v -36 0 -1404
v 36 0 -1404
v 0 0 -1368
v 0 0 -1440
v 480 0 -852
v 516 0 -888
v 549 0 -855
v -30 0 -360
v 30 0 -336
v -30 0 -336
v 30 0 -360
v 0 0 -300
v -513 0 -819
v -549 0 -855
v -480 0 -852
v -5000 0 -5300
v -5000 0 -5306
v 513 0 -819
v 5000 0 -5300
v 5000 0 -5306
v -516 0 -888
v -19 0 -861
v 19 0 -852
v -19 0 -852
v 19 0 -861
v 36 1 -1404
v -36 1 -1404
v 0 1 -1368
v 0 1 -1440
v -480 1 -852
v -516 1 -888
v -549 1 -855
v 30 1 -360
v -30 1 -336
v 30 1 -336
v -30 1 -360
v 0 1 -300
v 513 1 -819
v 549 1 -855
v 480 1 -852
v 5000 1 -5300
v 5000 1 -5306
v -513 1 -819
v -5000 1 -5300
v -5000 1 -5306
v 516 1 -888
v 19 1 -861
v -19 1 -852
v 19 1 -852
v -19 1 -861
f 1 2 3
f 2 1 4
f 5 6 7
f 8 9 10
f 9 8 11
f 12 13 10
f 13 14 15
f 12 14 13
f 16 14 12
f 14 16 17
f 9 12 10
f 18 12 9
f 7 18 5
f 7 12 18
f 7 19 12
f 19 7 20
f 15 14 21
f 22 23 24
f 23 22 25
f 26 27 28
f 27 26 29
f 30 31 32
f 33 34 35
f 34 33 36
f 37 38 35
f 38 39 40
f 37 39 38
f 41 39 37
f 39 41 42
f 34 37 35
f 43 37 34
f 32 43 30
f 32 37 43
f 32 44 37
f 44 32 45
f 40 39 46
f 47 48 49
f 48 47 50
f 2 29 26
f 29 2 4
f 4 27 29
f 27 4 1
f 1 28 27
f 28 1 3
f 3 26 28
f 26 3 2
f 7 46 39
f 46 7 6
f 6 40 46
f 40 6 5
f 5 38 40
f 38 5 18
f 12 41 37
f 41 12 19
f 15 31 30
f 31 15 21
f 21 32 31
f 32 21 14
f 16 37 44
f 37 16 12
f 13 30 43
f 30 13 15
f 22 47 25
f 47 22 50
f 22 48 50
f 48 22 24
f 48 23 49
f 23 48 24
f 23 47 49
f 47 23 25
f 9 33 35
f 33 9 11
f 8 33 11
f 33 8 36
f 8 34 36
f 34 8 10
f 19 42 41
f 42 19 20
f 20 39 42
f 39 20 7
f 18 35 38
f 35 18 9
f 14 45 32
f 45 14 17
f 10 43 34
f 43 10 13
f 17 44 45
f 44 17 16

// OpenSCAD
$fs = 120;

$vpt = [0,1080,480];
$vpr = [-34,0,0];
$vpf = 45;

foul_line = 6;
plain_color = [1,1,1,0.8];
out_color = [1,0.75,0.75,0.8];
eat_color = [0.5,0.75,1,0.8];

// home, first, second, third, rubber
color([1,1,1]) scale([1,-1,-1]) rotate([90,0,0]) linear_extrude(1) {
    polygon([[-30,30*2+300],[30,30*2+300],[30,30+300],[0,300],[-30,30+300]]);
    polygon([[552-36*2,852],[552-36,852+36],[552,852],[552-36,852-36]]);
    polygon([[0,1404+36],[36,1404],[0,1404-36],[-36,1404]]);
    polygon([[-552+36*2,852],[-552+36,852+36],[-552,852],[-552+36,852-36]]);
    polygon([[-19,852],[19,852],[19,9+852],[-19,9+852]]);
}

// foul lines
color([1,1,1,0.5]) scale([1,-1,-1]) rotate([90,0,0]) linear_extrude(1) {
    polygon([[0,300],[-5000,300+5000],[-5000,300+5000+foul_line],[0,300+foul_line]]);
    polygon([[0,300],[5000,300+5000],[5000,300+5000+foul_line],[0,300+foul_line]]);
}

scale([0.1,0.1,-0.1]) translate([-23200,0,0]) {
    color(out_color) polyhedron([[7490,0,18626],[22900,0,31940],[7490,1800,18626],[22900,1800,31940]], [[0,1,3,2]]);
    color(out_color) polyhedron([[7490,0,18626],[7490,0,18726],[7490,1800,18626],[7490,1800,18726]], [[0,1,3,2]]);
    color(out_color) polyhedron([[22900,0,31940],[22900,0,32040],[22900,1800,31940],[22900,1800,32040]], [[0,1,3,2]]);
    color(out_color) polyhedron([[7490,0,18726],[22900,0,32040],[7490,1800,18726],[22900,1800,32040]], [[0,1,3,2]]);
    color(out_color) polyhedron([[7490,1800,18626],[7490,1800,18726],[22900,1800,31940],[22900,1800,32040]], [[0,1,3,2]]);
    color(eat_color) polyhedron([[6180,0,25840],[15320,0,33640],[6180,5,25840],[15320,5,33640]], [[0,1,3,2]]);
    color(eat_color) polyhedron([[6180,0,25840],[1180,0,30810],[6180,5,25840],[1180,5,30810]], [[0,1,3,2]]);
    color(eat_color) polyhedron([[15320,0,33640],[10320,0,38610],[15320,5,33640],[10320,5,38610]], [[0,1,3,2]]);
    color(eat_color) polyhedron([[1180,0,30810],[10320,0,38610],[1180,5,30810],[10320,5,38610]], [[0,1,3,2]]);
    color(eat_color) polyhedron([[6180,5,25840],[1180,5,30810],[15320,5,33640],[10320,5,38610]], [[0,1,3,2]]);
    color(out_color) polyhedron([[2320,0,36390],[10460,0,42630],[2320,1800,36390],[10460,1800,42630]], [[0,1,3,2]]);
    color(out_color) polyhedron([[2320,0,36390],[2320,0,36490],[2320,1800,36390],[2320,1800,36490]], [[0,1,3,2]]);
    color(out_color) polyhedron([[10460,0,42630],[10460,0,42730],[10460,1800,42630],[10460,1800,42730]], [[0,1,3,2]]);
    color(out_color) polyhedron([[2320,0,36490],[10460,0,42730],[2320,1800,36490],[10460,1800,42730]], [[0,1,3,2]]);
    color(out_color) polyhedron([[2320,1800,36390],[2320,1800,36490],[10460,1800,42630],[10460,1800,42730]], [[0,1,3,2]]);
    color(out_color) polyhedron([[10460,0,42630],[22900,0,31940],[10460,1800,42630],[22900,1800,31940]], [[0,1,3,2]]);
    color(out_color) polyhedron([[10460,0,42630],[10460,0,42730],[10460,1800,42630],[10460,1800,42730]], [[0,1,3,2]]);
    color(out_color) polyhedron([[22900,0,31940],[22900,0,32040],[22900,1800,31940],[22900,1800,32040]], [[0,1,3,2]]);
    color(out_color) polyhedron([[10460,0,42730],[22900,0,32040],[10460,1800,42730],[22900,1800,32040]], [[0,1,3,2]]);
    color(out_color) polyhedron([[10460,1800,42630],[10460,1800,42730],[22900,1800,31940],[22900,1800,32040]], [[0,1,3,2]]);
    color(out_color) polyhedron([[17260,0,27060],[22900,0,21620],[17260,1800,27060],[22900,1800,21620]], [[0,1,3,2]]);
    color(out_color) polyhedron([[17260,0,27060],[17360,0,27060],[17260,1800,27060],[17360,1800,27060]], [[0,1,3,2]]);
    color(out_color) polyhedron([[22900,0,21620],[23000,0,21620],[22900,1800,21620],[23000,1800,21620]], [[0,1,3,2]]);
    color(out_color) polyhedron([[17360,0,27060],[23000,0,21620],[17360,1800,27060],[23000,1800,21620]], [[0,1,3,2]]);
    color(out_color) polyhedron([[17260,1800,27060],[17360,1800,27060],[22900,1800,21620],[23000,1800,21620]], [[0,1,3,2]]);
    color(out_color) polyhedron([[22900,0,21620],[28980,0,26610],[22900,1800,21620],[28980,1800,26610]], [[0,1,3,2]]);
    color(out_color) polyhedron([[22900,0,21620],[22900,0,21720],[22900,1800,21620],[22900,1800,21720]], [[0,1,3,2]]);
    color(out_color) polyhedron([[28980,0,26610],[28980,0,26710],[28980,1800,26610],[28980,1800,26710]], [[0,1,3,2]]);
    color(out_color) polyhedron([[22900,0,21720],[28980,0,26710],[22900,1800,21720],[28980,1800,26710]], [[0,1,3,2]]);
    color(out_color) polyhedron([[22900,1800,21620],[22900,1800,21720],[28980,1800,26610],[28980,1800,26710]], [[0,1,3,2]]);
    color(out_color) polyhedron([[22900,0,21720],[22950,0,21720],[22900,10000,21720],[22950,10000,21720]], [[0,1,3,2]]);
    color(out_color) polyhedron([[22900,0,21720],[22900,0,21820],[22900,10000,21720],[22900,10000,21820]], [[0,1,3,2]]);
    color(out_color) polyhedron([[22950,0,21720],[22950,0,21820],[22950,10000,21720],[22950,10000,21820]], [[0,1,3,2]]);
    color(out_color) polyhedron([[22900,0,21820],[22950,0,21820],[22900,10000,21820],[22950,10000,21820]], [[0,1,3,2]]);
    color(out_color) polyhedron([[22900,10000,21720],[22900,10000,21820],[22950,10000,21720],[22950,10000,21820]], [[0,1,3,2]]);
    color(out_color) polyhedron([[23940,0,22470],[26540,0,20480],[23940,2000,22470],[26540,2000,20480]], [[0,1,3,2]]);
    color(out_color) polyhedron([[23940,0,22470],[26540,0,24600],[23940,2000,22470],[26540,3000,24600]], [[0,1,3,2]]);
    color(out_color) polyhedron([[26540,0,20480],[28870,0,22740],[26540,2000,20480],[28870,3000,22740]], [[0,1,3,2]]);
    color(out_color) polyhedron([[26540,0,24600],[28870,0,22740],[26540,3000,24600],[28870,3000,22740]], [[0,1,3,2]]);
    color(out_color) polyhedron([[23940,2000,22470],[26540,3000,24600],[26540,2000,20480],[28870,3000,22740]], [[0,1,3,2]]);
    color(out_color) polyhedron([[26540,0,24600],[28870,0,22740],[26540,3000,24600],[28870,3000,22740]], [[0,1,3,2]]);
    color(out_color) polyhedron([[26540,0,24600],[28980,0,26610],[26540,3000,24600],[28980,2000,26610]], [[0,1,3,2]]);
    color(out_color) polyhedron([[28870,0,22740],[30880,0,24700],[28870,3000,22740],[30880,2000,24700]], [[0,1,3,2]]);
    color(out_color) polyhedron([[28980,0,26610],[30880,0,24700],[28980,2000,26610],[30880,2000,24700]], [[0,1,3,2]]);
    color(out_color) polyhedron([[26540,3000,24600],[28980,2000,26610],[28870,3000,22740],[30880,2000,24700]], [[0,1,3,2]]);
    color(plain_color) polyhedron([[28980,0,26610],[40000,0,15510],[28980,1800,26610],[40000,1800,15510]], [[0,1,3,2]]);
    color(plain_color) polyhedron([[28980,0,26610],[28980,0,26710],[28980,1800,26610],[28980,1800,26710]], [[0,1,3,2]]);
    color(plain_color) polyhedron([[40000,0,15510],[40000,0,15610],[40000,1800,15510],[40000,1800,15610]], [[0,1,3,2]]);
    color(plain_color) polyhedron([[28980,0,26710],[40000,0,15610],[28980,1800,26710],[40000,1800,15610]], [[0,1,3,2]]);
    color(plain_color) polyhedron([[28980,1800,26610],[28980,1800,26710],[40000,1800,15510],[40000,1800,15610]], [[0,1,3,2]]);
    color(out_color) polyhedron([[33900,0,21650],[35690,0,24450],[33900,3000,21650],[35690,3000,24450]], [[0,1,3,2]]);
    color(out_color) polyhedron([[33900,0,21650],[28980,0,26610],[33900,3000,21650],[28980,3000,26610]], [[0,1,3,2]]);
    color(out_color) polyhedron([[35690,0,24450],[31070,0,28840],[35690,3000,24450],[31070,3000,28840]], [[0,1,3,2]]);
    color(out_color) polyhedron([[28980,0,26610],[31070,0,28840],[28980,3000,26610],[31070,3000,28840]], [[0,1,3,2]]);
    color(out_color) polyhedron([[33900,3000,21650],[28980,3000,26610],[35690,3000,24450],[31070,3000,28840]], [[0,1,3,2]]);
    color(out_color) polyhedron([[35430,0,20110],[37170,0,23040],[35430,2000,20110],[37170,2000,23040]], [[0,1,3,2]]);
    color(out_color) polyhedron([[35430,0,20110],[33900,0,21650],[35430,2000,20110],[33900,2000,21650]], [[0,1,3,2]]);
    color(out_color) polyhedron([[37170,0,23040],[35690,0,24450],[37170,2000,23040],[35690,2000,24450]], [[0,1,3,2]]);
    color(out_color) polyhedron([[33900,0,21650],[35690,0,24450],[33900,2000,21650],[35690,2000,24450]], [[0,1,3,2]]);
    color(out_color) polyhedron([[35430,2000,20110],[33900,2000,21650],[37170,2000,23040],[35690,2000,24450]], [[0,1,3,2]]);
    color(out_color) polyhedron([[40360,0,23630],[40360,0,26440],[40360,1800,23630],[40360,1800,26440]], [[0,1,3,2]]);
    color(out_color) polyhedron([[40360,0,23630],[23630,0,42630],[40360,1800,23630],[23630,1800,42630]], [[0,1,3,2]]);
    color(out_color) polyhedron([[40360,0,26440],[23630,0,42730],[40360,1800,26440],[23630,1800,42730]], [[0,1,3,2]]);
    color(out_color) polyhedron([[23630,0,42630],[23630,0,42730],[23630,1800,42630],[23630,1800,42730]], [[0,1,3,2]]);
    color(out_color) polyhedron([[40360,1800,23630],[23630,1800,42630],[40360,1800,26440],[23630,1800,42730]], [[0,1,3,2]]);
    color(out_color) polyhedron([[26050,0,37380],[30940,0,42630],[26050,10000,37380],[30940,10000,42630]], [[0,1,3,2]]);
    color(out_color) polyhedron([[26050,0,37380],[19440,0,42630],[26050,10000,37380],[19440,10000,42630]], [[0,1,3,2]]);
    color(out_color) polyhedron([[30940,0,42630],[23630,0,42630],[30940,10000,42630],[23630,10000,42630]], [[0,1,3,2]]);
    color(out_color) polyhedron([[19440,0,42630],[23630,0,42630],[19440,10000,42630],[23630,10000,42630]], [[0,1,3,2]]);
    color(out_color) polyhedron([[26050,10000,37380],[19440,10000,42630],[30940,10000,42630],[23630,10000,42630]], [[0,1,3,2]]);
    color(out_color) polyhedron([[34020,0,32510],[34020,0,32610],[34020,1800,32510],[34020,1800,32610]], [[0,1,3,2]]);
    color(out_color) polyhedron([[34020,0,32510],[23630,0,42630],[34020,1800,32510],[23630,1800,42630]], [[0,1,3,2]]);
    color(out_color) polyhedron([[34020,0,32610],[23630,0,42730],[34020,1800,32610],[23630,1800,42730]], [[0,1,3,2]]);
    color(out_color) polyhedron([[23630,0,42630],[23630,0,42730],[23630,1800,42630],[23630,1800,42730]], [[0,1,3,2]]);
    color(out_color) polyhedron([[34020,1800,32510],[23630,1800,42630],[34020,1800,32610],[23630,1800,42730]], [[0,1,3,2]]);
    color(out_color) polyhedron([[24460,0,1880],[35490,0,12970],[24460,1800,1880],[35490,1800,12970]], [[0,1,3,2]]);
    color(out_color) polyhedron([[24460,0,1880],[24460,0,1980],[24460,1800,1880],[24460,1800,1980]], [[0,1,3,2]]);
    color(out_color) polyhedron([[35490,0,12970],[35490,0,13070],[35490,1800,12970],[35490,1800,13070]], [[0,1,3,2]]);
    color(out_color) polyhedron([[24460,0,1980],[35490,0,13070],[24460,1800,1980],[35490,1800,13070]], [[0,1,3,2]]);
    color(out_color) polyhedron([[24460,1800,1880],[24460,1800,1980],[35490,1800,12970],[35490,1800,13070]], [[0,1,3,2]]);
    color(out_color) polyhedron([[21790,0,1880],[21800,0,1880],[21790,5,1880],[21800,5,1880]], [[0,1,3,2]]);
    color(out_color) polyhedron([[21790,0,1880],[10750,0,13310],[21790,5,1880],[10750,5,13310]], [[0,1,3,2]]);
    color(out_color) polyhedron([[21800,0,1880],[10760,0,13310],[21800,5,1880],[10760,5,13310]], [[0,1,3,2]]);
    color(out_color) polyhedron([[10750,0,13310],[10760,0,13310],[10750,5,13310],[10760,5,13310]], [[0,1,3,2]]);
    color(out_color) polyhedron([[21790,5,1880],[10750,5,13310],[21800,5,1880],[10760,5,13310]], [[0,1,3,2]]);
    color(out_color) polyhedron([[22900,0,31940],[28980,0,26610],[22900,5,31940],[28980,5,26610]], [[0,1,3,2]]);
    color(out_color) polyhedron([[22900,0,31940],[22900,0,31930],[22900,5,31940],[22900,5,31930]], [[0,1,3,2]]);
    color(out_color) polyhedron([[28980,0,26610],[28980,0,26620],[28980,5,26610],[28980,5,26620]], [[0,1,3,2]]);
    color(out_color) polyhedron([[22900,0,31930],[28980,0,26620],[22900,5,31930],[28980,5,26620]], [[0,1,3,2]]);
    color(out_color) polyhedron([[22900,5,31940],[22900,5,31930],[28980,5,26610],[28980,5,26620]], [[0,1,3,2]]);
    color(plain_color) polyhedron([[0,0,0],[0,0,0],[0,0,0],[0,0,0]], [[0,1,3,2]]);
    color(plain_color) polyhedron([[0,0,0],[0,0,0],[0,0,0],[0,0,0]], [[0,1,3,2]]);
    color(plain_color) polyhedron([[0,0,0],[0,0,0],[0,0,0],[0,0,0]], [[0,1,3,2]]);
    color(plain_color) polyhedron([[0,0,0],[0,0,0],[0,0,0],[0,0,0]], [[0,1,3,2]]);
    color(plain_color) polyhedron([[0,0,0],[0,0,0],[0,0,0],[0,0,0]], [[0,1,3,2]]);
    color(plain_color) polyhedron([[0,0,0],[0,0,0],[0,0,0],[0,0,0]], [[0,1,3,2]]);
    color(plain_color) polyhedron([[0,0,0],[0,0,0],[0,0,0],[0,0,0]], [[0,1,3,2]]);
    color(plain_color) polyhedron([[0,0,0],[0,0,0],[0,0,0],[0,0,0]], [[0,1,3,2]]);
    color(plain_color) polyhedron([[0,0,0],[0,0,0],[0,0,0],[0,0,0]], [[0,1,3,2]]);
    color(plain_color) polyhedron([[0,0,0],[0,0,0],[0,0,0],[0,0,0]], [[0,1,3,2]]);
    color(plain_color) polyhedron([[0,0,0],[0,0,0],[0,0,0],[0,0,0]], [[0,1,3,2]]);
    color(plain_color) polyhedron([[0,0,0],[0,0,0],[0,0,0],[0,0,0]], [[0,1,3,2]]);
    color(plain_color) polyhedron([[0,0,0],[0,0,0],[0,0,0],[0,0,0]], [[0,1,3,2]]);
    color(plain_color) polyhedron([[0,0,0],[0,0,0],[0,0,0],[0,0,0]], [[0,1,3,2]]);
    color(plain_color) polyhedron([[0,0,0],[0,0,0],[0,0,0],[0,0,0]], [[0,1,3,2]]);
    color(plain_color) polyhedron([[0,0,0],[0,0,0],[0,0,0],[0,0,0]], [[0,1,3,2]]);
    color(plain_color) polyhedron([[0,0,0],[0,0,0],[0,0,0],[0,0,0]], [[0,1,3,2]]);
    color(plain_color) polyhedron([[0,0,0],[0,0,0],[0,0,0],[0,0,0]], [[0,1,3,2]]);
    color(plain_color) polyhedron([[0,0,0],[0,0,0],[0,0,0],[0,0,0]], [[0,1,3,2]]);
    color(plain_color) polyhedron([[0,0,0],[0,0,0],[0,0,0],[0,0,0]], [[0,1,3,2]]);
    color(plain_color) polyhedron([[0,0,0],[0,0,0],[0,0,0],[0,0,0]], [[0,1,3,2]]);
    color(plain_color) polyhedron([[0,0,0],[0,0,0],[0,0,0],[0,0,0]], [[0,1,3,2]]);
    color(plain_color) polyhedron([[0,0,0],[0,0,0],[0,0,0],[0,0,0]], [[0,1,3,2]]);
    color(plain_color) polyhedron([[0,0,0],[0,0,0],[0,0,0],[0,0,0]], [[0,1,3,2]]);
    color(plain_color) polyhedron([[0,0,0],[0,0,0],[0,0,0],[0,0,0]], [[0,1,3,2]]);
    color(plain_color) polyhedron([[0,0,0],[0,0,0],[0,0,0],[0,0,0]], [[0,1,3,2]]);
    color(plain_color) polyhedron([[0,0,0],[0,0,0],[0,0,0],[0,0,0]], [[0,1,3,2]]);
    color(plain_color) polyhedron([[0,0,0],[0,0,0],[0,0,0],[0,0,0]], [[0,1,3,2]]);
    color(plain_color) polyhedron([[0,0,0],[0,0,0],[0,0,0],[0,0,0]], [[0,1,3,2]]);
    color(plain_color) polyhedron([[0,0,0],[0,0,0],[0,0,0],[0,0,0]], [[0,1,3,2]]);
    color(plain_color) polyhedron([[0,0,0],[0,0,0],[0,0,0],[0,0,0]], [[0,1,3,2]]);
    color(plain_color) polyhedron([[0,0,0],[0,0,0],[0,0,0],[0,0,0]], [[0,1,3,2]]);
    color(plain_color) polyhedron([[0,0,0],[0,0,0],[0,0,0],[0,0,0]], [[0,1,3,2]]);
    color(plain_color) polyhedron([[0,0,0],[0,0,0],[0,0,0],[0,0,0]], [[0,1,3,2]]);
    color(plain_color) polyhedron([[0,0,0],[0,0,0],[0,0,0],[0,0,0]], [[0,1,3,2]]);
    color(plain_color) polyhedron([[0,0,0],[0,0,0],[0,0,0],[0,0,0]], [[0,1,3,2]]);
    color(plain_color) polyhedron([[0,0,0],[0,0,0],[0,0,0],[0,0,0]], [[0,1,3,2]]);
    color(plain_color) polyhedron([[0,0,0],[0,0,0],[0,0,0],[0,0,0]], [[0,1,3,2]]);
    color(plain_color) polyhedron([[0,0,0],[0,0,0],[0,0,0],[0,0,0]], [[0,1,3,2]]);
    color(plain_color) polyhedron([[0,0,0],[0,0,0],[0,0,0],[0,0,0]], [[0,1,3,2]]);
    color(plain_color) polyhedron([[0,0,0],[0,0,0],[0,0,0],[0,0,0]], [[0,1,3,2]]);
    color(plain_color) polyhedron([[0,0,0],[0,0,0],[0,0,0],[0,0,0]], [[0,1,3,2]]);
    color(plain_color) polyhedron([[0,0,0],[0,0,0],[0,0,0],[0,0,0]], [[0,1,3,2]]);
    color(plain_color) polyhedron([[0,0,0],[0,0,0],[0,0,0],[0,0,0]], [[0,1,3,2]]);
    color(plain_color) polyhedron([[0,0,0],[0,0,0],[0,0,0],[0,0,0]], [[0,1,3,2]]);
    color(plain_color) polyhedron([[0,0,0],[0,0,0],[0,0,0],[0,0,0]], [[0,1,3,2]]);
    color(plain_color) polyhedron([[0,0,0],[0,0,0],[0,0,0],[0,0,0]], [[0,1,3,2]]);
    color(plain_color) polyhedron([[0,0,0],[0,0,0],[0,0,0],[0,0,0]], [[0,1,3,2]]);
    color(plain_color) polyhedron([[0,0,0],[0,0,0],[0,0,0],[0,0,0]], [[0,1,3,2]]);
    color(plain_color) polyhedron([[0,0,0],[0,0,0],[0,0,0],[0,0,0]], [[0,1,3,2]]);
    color(plain_color) polyhedron([[0,0,0],[0,0,0],[0,0,0],[0,0,0]], [[0,1,3,2]]);
    color(plain_color) polyhedron([[0,0,0],[0,0,0],[0,0,0],[0,0,0]], [[0,1,3,2]]);
    color(plain_color) polyhedron([[0,0,0],[0,0,0],[0,0,0],[0,0,0]], [[0,1,3,2]]);
    color(plain_color) polyhedron([[0,0,0],[0,0,0],[0,0,0],[0,0,0]], [[0,1,3,2]]);
    color(plain_color) polyhedron([[0,0,0],[0,0,0],[0,0,0],[0,0,0]], [[0,1,3,2]]);
    color(plain_color) polyhedron([[0,0,0],[0,0,0],[0,0,0],[0,0,0]], [[0,1,3,2]]);
    color(plain_color) polyhedron([[0,0,0],[0,0,0],[0,0,0],[0,0,0]], [[0,1,3,2]]);
    color(plain_color) polyhedron([[0,0,0],[0,0,0],[0,0,0],[0,0,0]], [[0,1,3,2]]);
    color(plain_color) polyhedron([[0,0,0],[0,0,0],[0,0,0],[0,0,0]], [[0,1,3,2]]);
    color(plain_color) polyhedron([[0,0,0],[0,0,0],[0,0,0],[0,0,0]], [[0,1,3,2]]);
    color(plain_color) polyhedron([[0,0,0],[0,0,0],[0,0,0],[0,0,0]], [[0,1,3,2]]);
    color(plain_color) polyhedron([[0,0,0],[0,0,0],[0,0,0],[0,0,0]], [[0,1,3,2]]);
    color(plain_color) polyhedron([[0,0,0],[0,0,0],[0,0,0],[0,0,0]], [[0,1,3,2]]);
    color(plain_color) polyhedron([[0,0,0],[0,0,0],[0,0,0],[0,0,0]], [[0,1,3,2]]);
    color(plain_color) polyhedron([[0,0,0],[0,0,0],[0,0,0],[0,0,0]], [[0,1,3,2]]);
    color(plain_color) polyhedron([[0,0,0],[0,0,0],[0,0,0],[0,0,0]], [[0,1,3,2]]);
    color(plain_color) polyhedron([[0,0,0],[0,0,0],[0,0,0],[0,0,0]], [[0,1,3,2]]);
    color(plain_color) polyhedron([[0,0,0],[0,0,0],[0,0,0],[0,0,0]], [[0,1,3,2]]);
    color(plain_color) polyhedron([[0,0,0],[0,0,0],[0,0,0],[0,0,0]], [[0,1,3,2]]);
    color(plain_color) polyhedron([[0,0,0],[0,0,0],[0,0,0],[0,0,0]], [[0,1,3,2]]);
    color(plain_color) polyhedron([[0,0,0],[0,0,0],[0,0,0],[0,0,0]], [[0,1,3,2]]);
    color(plain_color) polyhedron([[0,0,0],[0,0,0],[0,0,0],[0,0,0]], [[0,1,3,2]]);
    color(plain_color) polyhedron([[0,0,0],[0,0,0],[0,0,0],[0,0,0]], [[0,1,3,2]]);
    color(plain_color) polyhedron([[0,0,0],[0,0,0],[0,0,0],[0,0,0]], [[0,1,3,2]]);
    color(plain_color) polyhedron([[0,0,0],[0,0,0],[0,0,0],[0,0,0]], [[0,1,3,2]]);
    color(plain_color) polyhedron([[0,0,0],[0,0,0],[0,0,0],[0,0,0]], [[0,1,3,2]]);
    color(plain_color) polyhedron([[0,0,0],[0,0,0],[0,0,0],[0,0,0]], [[0,1,3,2]]);
    color(plain_color) polyhedron([[0,0,0],[0,0,0],[0,0,0],[0,0,0]], [[0,1,3,2]]);
    color(plain_color) polyhedron([[0,0,0],[0,0,0],[0,0,0],[0,0,0]], [[0,1,3,2]]);
    color(plain_color) polyhedron([[0,0,0],[0,0,0],[0,0,0],[0,0,0]], [[0,1,3,2]]);
    color(plain_color) polyhedron([[0,0,0],[0,0,0],[0,0,0],[0,0,0]], [[0,1,3,2]]);
    color(plain_color) polyhedron([[0,0,0],[0,0,0],[0,0,0],[0,0,0]], [[0,1,3,2]]);
    color(plain_color) polyhedron([[0,0,0],[0,0,0],[0,0,0],[0,0,0]], [[0,1,3,2]]);
    color(plain_color) polyhedron([[0,0,0],[0,0,0],[0,0,0],[0,0,0]], [[0,1,3,2]]);
    color(plain_color) polyhedron([[0,0,0],[0,0,0],[0,0,0],[0,0,0]], [[0,1,3,2]]);
    color(plain_color) polyhedron([[0,0,0],[0,0,0],[0,0,0],[0,0,0]], [[0,1,3,2]]);
    color(plain_color) polyhedron([[0,0,0],[0,0,0],[0,0,0],[0,0,0]], [[0,1,3,2]]);
    color(plain_color) polyhedron([[0,0,0],[0,0,0],[0,0,0],[0,0,0]], [[0,1,3,2]]);
    color(plain_color) polyhedron([[0,0,0],[0,0,0],[0,0,0],[0,0,0]], [[0,1,3,2]]);
    color(plain_color) polyhedron([[0,0,0],[0,0,0],[0,0,0],[0,0,0]], [[0,1,3,2]]);
    color(plain_color) polyhedron([[0,0,0],[0,0,0],[0,0,0],[0,0,0]], [[0,1,3,2]]);
    color(plain_color) polyhedron([[0,0,0],[0,0,0],[0,0,0],[0,0,0]], [[0,1,3,2]]);
    color(plain_color) polyhedron([[0,0,0],[0,0,0],[0,0,0],[0,0,0]], [[0,1,3,2]]);
    color(plain_color) polyhedron([[0,0,0],[0,0,0],[0,0,0],[0,0,0]], [[0,1,3,2]]);
    color(plain_color) polyhedron([[0,0,0],[0,0,0],[0,0,0],[0,0,0]], [[0,1,3,2]]);
    color(plain_color) polyhedron([[0,0,0],[0,0,0],[0,0,0],[0,0,0]], [[0,1,3,2]]);
    color(plain_color) polyhedron([[0,0,0],[0,0,0],[0,0,0],[0,0,0]], [[0,1,3,2]]);
    color(plain_color) polyhedron([[0,0,0],[0,0,0],[0,0,0],[0,0,0]], [[0,1,3,2]]);
    color(plain_color) polyhedron([[0,0,0],[0,0,0],[0,0,0],[0,0,0]], [[0,1,3,2]]);
    color(plain_color) polyhedron([[0,0,0],[0,0,0],[0,0,0],[0,0,0]], [[0,1,3,2]]);
    color(plain_color) polyhedron([[0,0,0],[0,0,0],[0,0,0],[0,0,0]], [[0,1,3,2]]);
    color(plain_color) polyhedron([[0,0,0],[0,0,0],[0,0,0],[0,0,0]], [[0,1,3,2]]);
    color(plain_color) polyhedron([[0,0,0],[0,0,0],[0,0,0],[0,0,0]], [[0,1,3,2]]);
    color(plain_color) polyhedron([[0,0,0],[0,0,0],[0,0,0],[0,0,0]], [[0,1,3,2]]);
    color(plain_color) polyhedron([[0,0,0],[0,0,0],[0,0,0],[0,0,0]], [[0,1,3,2]]);
    color(plain_color) polyhedron([[0,0,0],[0,0,0],[0,0,0],[0,0,0]], [[0,1,3,2]]);
    color(plain_color) polyhedron([[0,0,0],[0,0,0],[0,0,0],[0,0,0]], [[0,1,3,2]]);
    color(plain_color) polyhedron([[0,0,0],[0,0,0],[0,0,0],[0,0,0]], [[0,1,3,2]]);
    color(plain_color) polyhedron([[0,0,0],[0,0,0],[0,0,0],[0,0,0]], [[0,1,3,2]]);
    color(plain_color) polyhedron([[0,0,0],[0,0,0],[0,0,0],[0,0,0]], [[0,1,3,2]]);
    color(plain_color) polyhedron([[0,0,0],[0,0,0],[0,0,0],[0,0,0]], [[0,1,3,2]]);
    color(plain_color) polyhedron([[0,0,0],[0,0,0],[0,0,0],[0,0,0]], [[0,1,3,2]]);
    color(plain_color) polyhedron([[0,0,0],[0,0,0],[0,0,0],[0,0,0]], [[0,1,3,2]]);
    color(plain_color) polyhedron([[0,0,0],[0,0,0],[0,0,0],[0,0,0]], [[0,1,3,2]]);
    color(plain_color) polyhedron([[0,0,0],[0,0,0],[0,0,0],[0,0,0]], [[0,1,3,2]]);
    color(plain_color) polyhedron([[0,0,0],[0,0,0],[0,0,0],[0,0,0]], [[0,1,3,2]]);
    color(plain_color) polyhedron([[0,0,0],[0,0,0],[0,0,0],[0,0,0]], [[0,1,3,2]]);
    color(plain_color) polyhedron([[0,0,0],[0,0,0],[0,0,0],[0,0,0]], [[0,1,3,2]]);
    color(plain_color) polyhedron([[0,0,0],[0,0,0],[0,0,0],[0,0,0]], [[0,1,3,2]]);
    color(plain_color) polyhedron([[0,0,0],[0,0,0],[0,0,0],[0,0,0]], [[0,1,3,2]]);
    color(plain_color) polyhedron([[0,0,0],[0,0,0],[0,0,0],[0,0,0]], [[0,1,3,2]]);
    color(plain_color) polyhedron([[0,0,0],[0,0,0],[0,0,0],[0,0,0]], [[0,1,3,2]]);
    color(plain_color) polyhedron([[0,0,0],[0,0,0],[0,0,0],[0,0,0]], [[0,1,3,2]]);
    color(plain_color) polyhedron([[0,0,0],[0,0,0],[0,0,0],[0,0,0]], [[0,1,3,2]]);
    color(plain_color) polyhedron([[0,0,0],[0,0,0],[0,0,0],[0,0,0]], [[0,1,3,2]]);
    color(plain_color) polyhedron([[0,0,0],[0,0,0],[0,0,0],[0,0,0]], [[0,1,3,2]]);
    color(plain_color) polyhedron([[0,0,0],[0,0,0],[0,0,0],[0,0,0]], [[0,1,3,2]]);
    color(plain_color) polyhedron([[0,0,0],[0,0,0],[0,0,0],[0,0,0]], [[0,1,3,2]]);
    color(plain_color) polyhedron([[0,0,0],[0,0,0],[0,0,0],[0,0,0]], [[0,1,3,2]]);
    color(plain_color) polyhedron([[0,0,0],[0,0,0],[0,0,0],[0,0,0]], [[0,1,3,2]]);
    color(plain_color) polyhedron([[0,0,0],[0,0,0],[0,0,0],[0,0,0]], [[0,1,3,2]]);
    color(plain_color) polyhedron([[0,0,0],[0,0,0],[0,0,0],[0,0,0]], [[0,1,3,2]]);
    color(plain_color) polyhedron([[0,0,0],[0,0,0],[0,0,0],[0,0,0]], [[0,1,3,2]]);
    color(plain_color) polyhedron([[0,0,0],[0,0,0],[0,0,0],[0,0,0]], [[0,1,3,2]]);
    color(plain_color) polyhedron([[0,0,0],[0,0,0],[0,0,0],[0,0,0]], [[0,1,3,2]]);
    color(plain_color) polyhedron([[0,0,0],[0,0,0],[0,0,0],[0,0,0]], [[0,1,3,2]]);
    color(plain_color) polyhedron([[0,0,0],[0,0,0],[0,0,0],[0,0,0]], [[0,1,3,2]]);
    color(plain_color) polyhedron([[0,0,0],[0,0,0],[0,0,0],[0,0,0]], [[0,1,3,2]]);
    color(plain_color) polyhedron([[0,0,0],[0,0,0],[0,0,0],[0,0,0]], [[0,1,3,2]]);
    color(plain_color) polyhedron([[0,0,0],[0,0,0],[0,0,0],[0,0,0]], [[0,1,3,2]]);
    color(plain_color) polyhedron([[0,0,0],[0,0,0],[0,0,0],[0,0,0]], [[0,1,3,2]]);
    color(plain_color) polyhedron([[0,0,0],[0,0,0],[0,0,0],[0,0,0]], [[0,1,3,2]]);
    color(plain_color) polyhedron([[0,0,0],[0,0,0],[0,0,0],[0,0,0]], [[0,1,3,2]]);
    color(plain_color) polyhedron([[0,0,0],[0,0,0],[0,0,0],[0,0,0]], [[0,1,3,2]]);
    color(plain_color) polyhedron([[0,0,0],[0,0,0],[0,0,0],[0,0,0]], [[0,1,3,2]]);
    color(plain_color) polyhedron([[0,0,0],[0,0,0],[0,0,0],[0,0,0]], [[0,1,3,2]]);
    color(plain_color) polyhedron([[0,0,0],[0,0,0],[0,0,0],[0,0,0]], [[0,1,3,2]]);
    color(plain_color) polyhedron([[0,0,0],[0,0,0],[0,0,0],[0,0,0]], [[0,1,3,2]]);
    color(plain_color) polyhedron([[0,0,0],[0,0,0],[0,0,0],[0,0,0]], [[0,1,3,2]]);
    color(plain_color) polyhedron([[0,0,0],[0,0,0],[0,0,0],[0,0,0]], [[0,1,3,2]]);
    color(plain_color) polyhedron([[0,0,0],[0,0,0],[0,0,0],[0,0,0]], [[0,1,3,2]]);
    color(plain_color) polyhedron([[0,0,0],[0,0,0],[0,0,0],[0,0,0]], [[0,1,3,2]]);
    color(plain_color) polyhedron([[0,0,0],[0,0,0],[0,0,0],[0,0,0]], [[0,1,3,2]]);
    color(plain_color) polyhedron([[0,0,0],[0,0,0],[0,0,0],[0,0,0]], [[0,1,3,2]]);
    color(plain_color) polyhedron([[0,0,0],[0,0,0],[0,0,0],[0,0,0]], [[0,1,3,2]]);
    color(plain_color) polyhedron([[0,0,0],[0,0,0],[0,0,0],[0,0,0]], [[0,1,3,2]]);
    color(plain_color) polyhedron([[0,0,0],[0,0,0],[0,0,0],[0,0,0]], [[0,1,3,2]]);
    color(plain_color) polyhedron([[0,0,0],[0,0,0],[0,0,0],[0,0,0]], [[0,1,3,2]]);
    color(plain_color) polyhedron([[0,0,0],[0,0,0],[0,0,0],[0,0,0]], [[0,1,3,2]]);
    color(plain_color) polyhedron([[0,0,0],[0,0,0],[0,0,0],[0,0,0]], [[0,1,3,2]]);
    color(plain_color) polyhedron([[0,0,0],[0,0,0],[0,0,0],[0,0,0]], [[0,1,3,2]]);
    color(plain_color) polyhedron([[0,0,0],[0,0,0],[0,0,0],[0,0,0]], [[0,1,3,2]]);
    color(plain_color) polyhedron([[0,0,0],[0,0,0],[0,0,0],[0,0,0]], [[0,1,3,2]]);
    color(plain_color) polyhedron([[0,0,0],[0,0,0],[0,0,0],[0,0,0]], [[0,1,3,2]]);
    color(plain_color) polyhedron([[0,0,0],[0,0,0],[0,0,0],[0,0,0]], [[0,1,3,2]]);
    color(plain_color) polyhedron([[0,0,0],[0,0,0],[0,0,0],[0,0,0]], [[0,1,3,2]]);
    color(plain_color) polyhedron([[0,0,0],[0,0,0],[0,0,0],[0,0,0]], [[0,1,3,2]]);
    color(plain_color) polyhedron([[0,0,0],[0,0,0],[0,0,0],[0,0,0]], [[0,1,3,2]]);
    color(plain_color) polyhedron([[0,0,0],[0,0,0],[0,0,0],[0,0,0]], [[0,1,3,2]]);
    color(plain_color) polyhedron([[0,0,0],[0,0,0],[0,0,0],[0,0,0]], [[0,1,3,2]]);
    color(plain_color) polyhedron([[0,0,0],[0,0,0],[0,0,0],[0,0,0]], [[0,1,3,2]]);
    color(plain_color) polyhedron([[0,0,0],[0,0,0],[0,0,0],[0,0,0]], [[0,1,3,2]]);
    color(plain_color) polyhedron([[0,0,0],[0,0,0],[0,0,0],[0,0,0]], [[0,1,3,2]]);
    color(plain_color) polyhedron([[0,0,0],[0,0,0],[0,0,0],[0,0,0]], [[0,1,3,2]]);
    color(plain_color) polyhedron([[0,0,0],[0,0,0],[0,0,0],[0,0,0]], [[0,1,3,2]]);
    color(plain_color) polyhedron([[0,0,0],[0,0,0],[0,0,0],[0,0,0]], [[0,1,3,2]]);
    color(plain_color) polyhedron([[0,0,0],[0,0,0],[0,0,0],[0,0,0]], [[0,1,3,2]]);
    color(plain_color) polyhedron([[0,0,0],[0,0,0],[0,0,0],[0,0,0]], [[0,1,3,2]]);
    color(plain_color) polyhedron([[0,0,0],[0,0,0],[0,0,0],[0,0,0]], [[0,1,3,2]]);
    color(plain_color) polyhedron([[0,0,0],[0,0,0],[0,0,0],[0,0,0]], [[0,1,3,2]]);
    color(plain_color) polyhedron([[0,0,0],[0,0,0],[0,0,0],[0,0,0]], [[0,1,3,2]]);
    color(plain_color) polyhedron([[0,0,0],[0,0,0],[0,0,0],[0,0,0]], [[0,1,3,2]]);
    color(plain_color) polyhedron([[0,0,0],[0,0,0],[0,0,0],[0,0,0]], [[0,1,3,2]]);
    color(plain_color) polyhedron([[0,0,0],[0,0,0],[0,0,0],[0,0,0]], [[0,1,3,2]]);
    color(plain_color) polyhedron([[0,0,0],[0,0,0],[0,0,0],[0,0,0]], [[0,1,3,2]]);
    color(plain_color) polyhedron([[0,0,0],[0,0,0],[0,0,0],[0,0,0]], [[0,1,3,2]]);
    color(plain_color) polyhedron([[0,0,0],[0,0,0],[0,0,0],[0,0,0]], [[0,1,3,2]]);
    color(plain_color) polyhedron([[0,0,0],[0,0,0],[0,0,0],[0,0,0]], [[0,1,3,2]]);
    color(plain_color) polyhedron([[0,0,0],[0,0,0],[0,0,0],[0,0,0]], [[0,1,3,2]]);
    color(plain_color) polyhedron([[0,0,0],[0,0,0],[0,0,0],[0,0,0]], [[0,1,3,2]]);
    color(plain_color) polyhedron([[0,0,0],[0,0,0],[0,0,0],[0,0,0]], [[0,1,3,2]]);
    color(plain_color) polyhedron([[0,0,0],[0,0,0],[0,0,0],[0,0,0]], [[0,1,3,2]]);
    color(plain_color) polyhedron([[0,0,0],[0,0,0],[0,0,0],[0,0,0]], [[0,1,3,2]]);
    color(plain_color) polyhedron([[0,0,0],[0,0,0],[0,0,0],[0,0,0]], [[0,1,3,2]]);
    color(plain_color) polyhedron([[0,0,0],[0,0,0],[0,0,0],[0,0,0]], [[0,1,3,2]]);
    color(plain_color) polyhedron([[0,0,0],[0,0,0],[0,0,0],[0,0,0]], [[0,1,3,2]]);
    color(plain_color) polyhedron([[0,0,0],[0,0,0],[0,0,0],[0,0,0]], [[0,1,3,2]]);
    color(plain_color) polyhedron([[0,0,0],[0,0,0],[0,0,0],[0,0,0]], [[0,1,3,2]]);
    color(plain_color) polyhedron([[0,0,0],[0,0,0],[0,0,0],[0,0,0]], [[0,1,3,2]]);
    color(plain_color) polyhedron([[0,0,0],[0,0,0],[0,0,0],[0,0,0]], [[0,1,3,2]]);
    color(plain_color) polyhedron([[0,0,0],[0,0,0],[0,0,0],[0,0,0]], [[0,1,3,2]]);
    color(plain_color) polyhedron([[0,0,0],[0,0,0],[0,0,0],[0,0,0]], [[0,1,3,2]]);
    color(plain_color) polyhedron([[0,0,0],[0,0,0],[0,0,0],[0,0,0]], [[0,1,3,2]]);
    color(plain_color) polyhedron([[0,0,0],[0,0,0],[0,0,0],[0,0,0]], [[0,1,3,2]]);
    color(plain_color) polyhedron([[0,0,0],[0,0,0],[0,0,0],[0,0,0]], [[0,1,3,2]]);
    color(plain_color) polyhedron([[0,0,0],[0,0,0],[0,0,0],[0,0,0]], [[0,1,3,2]]);
    color(plain_color) polyhedron([[0,0,0],[0,0,0],[0,0,0],[0,0,0]], [[0,1,3,2]]);
    color(plain_color) polyhedron([[0,0,0],[0,0,0],[0,0,0],[0,0,0]], [[0,1,3,2]]);
    color(plain_color) polyhedron([[0,0,0],[0,0,0],[0,0,0],[0,0,0]], [[0,1,3,2]]);
    color(plain_color) polyhedron([[0,0,0],[0,0,0],[0,0,0],[0,0,0]], [[0,1,3,2]]);
    color(plain_color) polyhedron([[0,0,0],[0,0,0],[0,0,0],[0,0,0]], [[0,1,3,2]]);
    color(plain_color) polyhedron([[0,0,0],[0,0,0],[0,0,0],[0,0,0]], [[0,1,3,2]]);
    color(plain_color) polyhedron([[0,0,0],[0,0,0],[0,0,0],[0,0,0]], [[0,1,3,2]]);
    color(plain_color) polyhedron([[0,0,0],[0,0,0],[0,0,0],[0,0,0]], [[0,1,3,2]]);
    color(plain_color) polyhedron([[0,0,0],[0,0,0],[0,0,0],[0,0,0]], [[0,1,3,2]]);
    color(plain_color) polyhedron([[0,0,0],[0,0,0],[0,0,0],[0,0,0]], [[0,1,3,2]]);
    color(plain_color) polyhedron([[0,0,0],[0,0,0],[0,0,0],[0,0,0]], [[0,1,3,2]]);
    color(plain_color) polyhedron([[0,0,0],[0,0,0],[0,0,0],[0,0,0]], [[0,1,3,2]]);
    color(plain_color) polyhedron([[0,0,0],[0,0,0],[0,0,0],[0,0,0]], [[0,1,3,2]]);
    color(plain_color) polyhedron([[0,0,0],[0,0,0],[0,0,0],[0,0,0]], [[0,1,3,2]]);
    color(plain_color) polyhedron([[0,0,0],[0,0,0],[0,0,0],[0,0,0]], [[0,1,3,2]]);
    color(plain_color) polyhedron([[0,0,0],[0,0,0],[0,0,0],[0,0,0]], [[0,1,3,2]]);
    color(plain_color) polyhedron([[0,0,0],[0,0,0],[0,0,0],[0,0,0]], [[0,1,3,2]]);
    color(plain_color) polyhedron([[0,0,0],[0,0,0],[0,0,0],[0,0,0]], [[0,1,3,2]]);
    color(plain_color) polyhedron([[0,0,0],[0,0,0],[0,0,0],[0,0,0]], [[0,1,3,2]]);
    color(plain_color) polyhedron([[0,0,0],[0,0,0],[0,0,0],[0,0,0]], [[0,1,3,2]]);
    color(plain_color) polyhedron([[0,0,0],[0,0,0],[0,0,0],[0,0,0]], [[0,1,3,2]]);
    color(plain_color) polyhedron([[0,0,0],[0,0,0],[0,0,0],[0,0,0]], [[0,1,3,2]]);
    color(plain_color) polyhedron([[0,0,0],[0,0,0],[0,0,0],[0,0,0]], [[0,1,3,2]]);
    color(plain_color) polyhedron([[0,0,0],[0,0,0],[0,0,0],[0,0,0]], [[0,1,3,2]]);
}
